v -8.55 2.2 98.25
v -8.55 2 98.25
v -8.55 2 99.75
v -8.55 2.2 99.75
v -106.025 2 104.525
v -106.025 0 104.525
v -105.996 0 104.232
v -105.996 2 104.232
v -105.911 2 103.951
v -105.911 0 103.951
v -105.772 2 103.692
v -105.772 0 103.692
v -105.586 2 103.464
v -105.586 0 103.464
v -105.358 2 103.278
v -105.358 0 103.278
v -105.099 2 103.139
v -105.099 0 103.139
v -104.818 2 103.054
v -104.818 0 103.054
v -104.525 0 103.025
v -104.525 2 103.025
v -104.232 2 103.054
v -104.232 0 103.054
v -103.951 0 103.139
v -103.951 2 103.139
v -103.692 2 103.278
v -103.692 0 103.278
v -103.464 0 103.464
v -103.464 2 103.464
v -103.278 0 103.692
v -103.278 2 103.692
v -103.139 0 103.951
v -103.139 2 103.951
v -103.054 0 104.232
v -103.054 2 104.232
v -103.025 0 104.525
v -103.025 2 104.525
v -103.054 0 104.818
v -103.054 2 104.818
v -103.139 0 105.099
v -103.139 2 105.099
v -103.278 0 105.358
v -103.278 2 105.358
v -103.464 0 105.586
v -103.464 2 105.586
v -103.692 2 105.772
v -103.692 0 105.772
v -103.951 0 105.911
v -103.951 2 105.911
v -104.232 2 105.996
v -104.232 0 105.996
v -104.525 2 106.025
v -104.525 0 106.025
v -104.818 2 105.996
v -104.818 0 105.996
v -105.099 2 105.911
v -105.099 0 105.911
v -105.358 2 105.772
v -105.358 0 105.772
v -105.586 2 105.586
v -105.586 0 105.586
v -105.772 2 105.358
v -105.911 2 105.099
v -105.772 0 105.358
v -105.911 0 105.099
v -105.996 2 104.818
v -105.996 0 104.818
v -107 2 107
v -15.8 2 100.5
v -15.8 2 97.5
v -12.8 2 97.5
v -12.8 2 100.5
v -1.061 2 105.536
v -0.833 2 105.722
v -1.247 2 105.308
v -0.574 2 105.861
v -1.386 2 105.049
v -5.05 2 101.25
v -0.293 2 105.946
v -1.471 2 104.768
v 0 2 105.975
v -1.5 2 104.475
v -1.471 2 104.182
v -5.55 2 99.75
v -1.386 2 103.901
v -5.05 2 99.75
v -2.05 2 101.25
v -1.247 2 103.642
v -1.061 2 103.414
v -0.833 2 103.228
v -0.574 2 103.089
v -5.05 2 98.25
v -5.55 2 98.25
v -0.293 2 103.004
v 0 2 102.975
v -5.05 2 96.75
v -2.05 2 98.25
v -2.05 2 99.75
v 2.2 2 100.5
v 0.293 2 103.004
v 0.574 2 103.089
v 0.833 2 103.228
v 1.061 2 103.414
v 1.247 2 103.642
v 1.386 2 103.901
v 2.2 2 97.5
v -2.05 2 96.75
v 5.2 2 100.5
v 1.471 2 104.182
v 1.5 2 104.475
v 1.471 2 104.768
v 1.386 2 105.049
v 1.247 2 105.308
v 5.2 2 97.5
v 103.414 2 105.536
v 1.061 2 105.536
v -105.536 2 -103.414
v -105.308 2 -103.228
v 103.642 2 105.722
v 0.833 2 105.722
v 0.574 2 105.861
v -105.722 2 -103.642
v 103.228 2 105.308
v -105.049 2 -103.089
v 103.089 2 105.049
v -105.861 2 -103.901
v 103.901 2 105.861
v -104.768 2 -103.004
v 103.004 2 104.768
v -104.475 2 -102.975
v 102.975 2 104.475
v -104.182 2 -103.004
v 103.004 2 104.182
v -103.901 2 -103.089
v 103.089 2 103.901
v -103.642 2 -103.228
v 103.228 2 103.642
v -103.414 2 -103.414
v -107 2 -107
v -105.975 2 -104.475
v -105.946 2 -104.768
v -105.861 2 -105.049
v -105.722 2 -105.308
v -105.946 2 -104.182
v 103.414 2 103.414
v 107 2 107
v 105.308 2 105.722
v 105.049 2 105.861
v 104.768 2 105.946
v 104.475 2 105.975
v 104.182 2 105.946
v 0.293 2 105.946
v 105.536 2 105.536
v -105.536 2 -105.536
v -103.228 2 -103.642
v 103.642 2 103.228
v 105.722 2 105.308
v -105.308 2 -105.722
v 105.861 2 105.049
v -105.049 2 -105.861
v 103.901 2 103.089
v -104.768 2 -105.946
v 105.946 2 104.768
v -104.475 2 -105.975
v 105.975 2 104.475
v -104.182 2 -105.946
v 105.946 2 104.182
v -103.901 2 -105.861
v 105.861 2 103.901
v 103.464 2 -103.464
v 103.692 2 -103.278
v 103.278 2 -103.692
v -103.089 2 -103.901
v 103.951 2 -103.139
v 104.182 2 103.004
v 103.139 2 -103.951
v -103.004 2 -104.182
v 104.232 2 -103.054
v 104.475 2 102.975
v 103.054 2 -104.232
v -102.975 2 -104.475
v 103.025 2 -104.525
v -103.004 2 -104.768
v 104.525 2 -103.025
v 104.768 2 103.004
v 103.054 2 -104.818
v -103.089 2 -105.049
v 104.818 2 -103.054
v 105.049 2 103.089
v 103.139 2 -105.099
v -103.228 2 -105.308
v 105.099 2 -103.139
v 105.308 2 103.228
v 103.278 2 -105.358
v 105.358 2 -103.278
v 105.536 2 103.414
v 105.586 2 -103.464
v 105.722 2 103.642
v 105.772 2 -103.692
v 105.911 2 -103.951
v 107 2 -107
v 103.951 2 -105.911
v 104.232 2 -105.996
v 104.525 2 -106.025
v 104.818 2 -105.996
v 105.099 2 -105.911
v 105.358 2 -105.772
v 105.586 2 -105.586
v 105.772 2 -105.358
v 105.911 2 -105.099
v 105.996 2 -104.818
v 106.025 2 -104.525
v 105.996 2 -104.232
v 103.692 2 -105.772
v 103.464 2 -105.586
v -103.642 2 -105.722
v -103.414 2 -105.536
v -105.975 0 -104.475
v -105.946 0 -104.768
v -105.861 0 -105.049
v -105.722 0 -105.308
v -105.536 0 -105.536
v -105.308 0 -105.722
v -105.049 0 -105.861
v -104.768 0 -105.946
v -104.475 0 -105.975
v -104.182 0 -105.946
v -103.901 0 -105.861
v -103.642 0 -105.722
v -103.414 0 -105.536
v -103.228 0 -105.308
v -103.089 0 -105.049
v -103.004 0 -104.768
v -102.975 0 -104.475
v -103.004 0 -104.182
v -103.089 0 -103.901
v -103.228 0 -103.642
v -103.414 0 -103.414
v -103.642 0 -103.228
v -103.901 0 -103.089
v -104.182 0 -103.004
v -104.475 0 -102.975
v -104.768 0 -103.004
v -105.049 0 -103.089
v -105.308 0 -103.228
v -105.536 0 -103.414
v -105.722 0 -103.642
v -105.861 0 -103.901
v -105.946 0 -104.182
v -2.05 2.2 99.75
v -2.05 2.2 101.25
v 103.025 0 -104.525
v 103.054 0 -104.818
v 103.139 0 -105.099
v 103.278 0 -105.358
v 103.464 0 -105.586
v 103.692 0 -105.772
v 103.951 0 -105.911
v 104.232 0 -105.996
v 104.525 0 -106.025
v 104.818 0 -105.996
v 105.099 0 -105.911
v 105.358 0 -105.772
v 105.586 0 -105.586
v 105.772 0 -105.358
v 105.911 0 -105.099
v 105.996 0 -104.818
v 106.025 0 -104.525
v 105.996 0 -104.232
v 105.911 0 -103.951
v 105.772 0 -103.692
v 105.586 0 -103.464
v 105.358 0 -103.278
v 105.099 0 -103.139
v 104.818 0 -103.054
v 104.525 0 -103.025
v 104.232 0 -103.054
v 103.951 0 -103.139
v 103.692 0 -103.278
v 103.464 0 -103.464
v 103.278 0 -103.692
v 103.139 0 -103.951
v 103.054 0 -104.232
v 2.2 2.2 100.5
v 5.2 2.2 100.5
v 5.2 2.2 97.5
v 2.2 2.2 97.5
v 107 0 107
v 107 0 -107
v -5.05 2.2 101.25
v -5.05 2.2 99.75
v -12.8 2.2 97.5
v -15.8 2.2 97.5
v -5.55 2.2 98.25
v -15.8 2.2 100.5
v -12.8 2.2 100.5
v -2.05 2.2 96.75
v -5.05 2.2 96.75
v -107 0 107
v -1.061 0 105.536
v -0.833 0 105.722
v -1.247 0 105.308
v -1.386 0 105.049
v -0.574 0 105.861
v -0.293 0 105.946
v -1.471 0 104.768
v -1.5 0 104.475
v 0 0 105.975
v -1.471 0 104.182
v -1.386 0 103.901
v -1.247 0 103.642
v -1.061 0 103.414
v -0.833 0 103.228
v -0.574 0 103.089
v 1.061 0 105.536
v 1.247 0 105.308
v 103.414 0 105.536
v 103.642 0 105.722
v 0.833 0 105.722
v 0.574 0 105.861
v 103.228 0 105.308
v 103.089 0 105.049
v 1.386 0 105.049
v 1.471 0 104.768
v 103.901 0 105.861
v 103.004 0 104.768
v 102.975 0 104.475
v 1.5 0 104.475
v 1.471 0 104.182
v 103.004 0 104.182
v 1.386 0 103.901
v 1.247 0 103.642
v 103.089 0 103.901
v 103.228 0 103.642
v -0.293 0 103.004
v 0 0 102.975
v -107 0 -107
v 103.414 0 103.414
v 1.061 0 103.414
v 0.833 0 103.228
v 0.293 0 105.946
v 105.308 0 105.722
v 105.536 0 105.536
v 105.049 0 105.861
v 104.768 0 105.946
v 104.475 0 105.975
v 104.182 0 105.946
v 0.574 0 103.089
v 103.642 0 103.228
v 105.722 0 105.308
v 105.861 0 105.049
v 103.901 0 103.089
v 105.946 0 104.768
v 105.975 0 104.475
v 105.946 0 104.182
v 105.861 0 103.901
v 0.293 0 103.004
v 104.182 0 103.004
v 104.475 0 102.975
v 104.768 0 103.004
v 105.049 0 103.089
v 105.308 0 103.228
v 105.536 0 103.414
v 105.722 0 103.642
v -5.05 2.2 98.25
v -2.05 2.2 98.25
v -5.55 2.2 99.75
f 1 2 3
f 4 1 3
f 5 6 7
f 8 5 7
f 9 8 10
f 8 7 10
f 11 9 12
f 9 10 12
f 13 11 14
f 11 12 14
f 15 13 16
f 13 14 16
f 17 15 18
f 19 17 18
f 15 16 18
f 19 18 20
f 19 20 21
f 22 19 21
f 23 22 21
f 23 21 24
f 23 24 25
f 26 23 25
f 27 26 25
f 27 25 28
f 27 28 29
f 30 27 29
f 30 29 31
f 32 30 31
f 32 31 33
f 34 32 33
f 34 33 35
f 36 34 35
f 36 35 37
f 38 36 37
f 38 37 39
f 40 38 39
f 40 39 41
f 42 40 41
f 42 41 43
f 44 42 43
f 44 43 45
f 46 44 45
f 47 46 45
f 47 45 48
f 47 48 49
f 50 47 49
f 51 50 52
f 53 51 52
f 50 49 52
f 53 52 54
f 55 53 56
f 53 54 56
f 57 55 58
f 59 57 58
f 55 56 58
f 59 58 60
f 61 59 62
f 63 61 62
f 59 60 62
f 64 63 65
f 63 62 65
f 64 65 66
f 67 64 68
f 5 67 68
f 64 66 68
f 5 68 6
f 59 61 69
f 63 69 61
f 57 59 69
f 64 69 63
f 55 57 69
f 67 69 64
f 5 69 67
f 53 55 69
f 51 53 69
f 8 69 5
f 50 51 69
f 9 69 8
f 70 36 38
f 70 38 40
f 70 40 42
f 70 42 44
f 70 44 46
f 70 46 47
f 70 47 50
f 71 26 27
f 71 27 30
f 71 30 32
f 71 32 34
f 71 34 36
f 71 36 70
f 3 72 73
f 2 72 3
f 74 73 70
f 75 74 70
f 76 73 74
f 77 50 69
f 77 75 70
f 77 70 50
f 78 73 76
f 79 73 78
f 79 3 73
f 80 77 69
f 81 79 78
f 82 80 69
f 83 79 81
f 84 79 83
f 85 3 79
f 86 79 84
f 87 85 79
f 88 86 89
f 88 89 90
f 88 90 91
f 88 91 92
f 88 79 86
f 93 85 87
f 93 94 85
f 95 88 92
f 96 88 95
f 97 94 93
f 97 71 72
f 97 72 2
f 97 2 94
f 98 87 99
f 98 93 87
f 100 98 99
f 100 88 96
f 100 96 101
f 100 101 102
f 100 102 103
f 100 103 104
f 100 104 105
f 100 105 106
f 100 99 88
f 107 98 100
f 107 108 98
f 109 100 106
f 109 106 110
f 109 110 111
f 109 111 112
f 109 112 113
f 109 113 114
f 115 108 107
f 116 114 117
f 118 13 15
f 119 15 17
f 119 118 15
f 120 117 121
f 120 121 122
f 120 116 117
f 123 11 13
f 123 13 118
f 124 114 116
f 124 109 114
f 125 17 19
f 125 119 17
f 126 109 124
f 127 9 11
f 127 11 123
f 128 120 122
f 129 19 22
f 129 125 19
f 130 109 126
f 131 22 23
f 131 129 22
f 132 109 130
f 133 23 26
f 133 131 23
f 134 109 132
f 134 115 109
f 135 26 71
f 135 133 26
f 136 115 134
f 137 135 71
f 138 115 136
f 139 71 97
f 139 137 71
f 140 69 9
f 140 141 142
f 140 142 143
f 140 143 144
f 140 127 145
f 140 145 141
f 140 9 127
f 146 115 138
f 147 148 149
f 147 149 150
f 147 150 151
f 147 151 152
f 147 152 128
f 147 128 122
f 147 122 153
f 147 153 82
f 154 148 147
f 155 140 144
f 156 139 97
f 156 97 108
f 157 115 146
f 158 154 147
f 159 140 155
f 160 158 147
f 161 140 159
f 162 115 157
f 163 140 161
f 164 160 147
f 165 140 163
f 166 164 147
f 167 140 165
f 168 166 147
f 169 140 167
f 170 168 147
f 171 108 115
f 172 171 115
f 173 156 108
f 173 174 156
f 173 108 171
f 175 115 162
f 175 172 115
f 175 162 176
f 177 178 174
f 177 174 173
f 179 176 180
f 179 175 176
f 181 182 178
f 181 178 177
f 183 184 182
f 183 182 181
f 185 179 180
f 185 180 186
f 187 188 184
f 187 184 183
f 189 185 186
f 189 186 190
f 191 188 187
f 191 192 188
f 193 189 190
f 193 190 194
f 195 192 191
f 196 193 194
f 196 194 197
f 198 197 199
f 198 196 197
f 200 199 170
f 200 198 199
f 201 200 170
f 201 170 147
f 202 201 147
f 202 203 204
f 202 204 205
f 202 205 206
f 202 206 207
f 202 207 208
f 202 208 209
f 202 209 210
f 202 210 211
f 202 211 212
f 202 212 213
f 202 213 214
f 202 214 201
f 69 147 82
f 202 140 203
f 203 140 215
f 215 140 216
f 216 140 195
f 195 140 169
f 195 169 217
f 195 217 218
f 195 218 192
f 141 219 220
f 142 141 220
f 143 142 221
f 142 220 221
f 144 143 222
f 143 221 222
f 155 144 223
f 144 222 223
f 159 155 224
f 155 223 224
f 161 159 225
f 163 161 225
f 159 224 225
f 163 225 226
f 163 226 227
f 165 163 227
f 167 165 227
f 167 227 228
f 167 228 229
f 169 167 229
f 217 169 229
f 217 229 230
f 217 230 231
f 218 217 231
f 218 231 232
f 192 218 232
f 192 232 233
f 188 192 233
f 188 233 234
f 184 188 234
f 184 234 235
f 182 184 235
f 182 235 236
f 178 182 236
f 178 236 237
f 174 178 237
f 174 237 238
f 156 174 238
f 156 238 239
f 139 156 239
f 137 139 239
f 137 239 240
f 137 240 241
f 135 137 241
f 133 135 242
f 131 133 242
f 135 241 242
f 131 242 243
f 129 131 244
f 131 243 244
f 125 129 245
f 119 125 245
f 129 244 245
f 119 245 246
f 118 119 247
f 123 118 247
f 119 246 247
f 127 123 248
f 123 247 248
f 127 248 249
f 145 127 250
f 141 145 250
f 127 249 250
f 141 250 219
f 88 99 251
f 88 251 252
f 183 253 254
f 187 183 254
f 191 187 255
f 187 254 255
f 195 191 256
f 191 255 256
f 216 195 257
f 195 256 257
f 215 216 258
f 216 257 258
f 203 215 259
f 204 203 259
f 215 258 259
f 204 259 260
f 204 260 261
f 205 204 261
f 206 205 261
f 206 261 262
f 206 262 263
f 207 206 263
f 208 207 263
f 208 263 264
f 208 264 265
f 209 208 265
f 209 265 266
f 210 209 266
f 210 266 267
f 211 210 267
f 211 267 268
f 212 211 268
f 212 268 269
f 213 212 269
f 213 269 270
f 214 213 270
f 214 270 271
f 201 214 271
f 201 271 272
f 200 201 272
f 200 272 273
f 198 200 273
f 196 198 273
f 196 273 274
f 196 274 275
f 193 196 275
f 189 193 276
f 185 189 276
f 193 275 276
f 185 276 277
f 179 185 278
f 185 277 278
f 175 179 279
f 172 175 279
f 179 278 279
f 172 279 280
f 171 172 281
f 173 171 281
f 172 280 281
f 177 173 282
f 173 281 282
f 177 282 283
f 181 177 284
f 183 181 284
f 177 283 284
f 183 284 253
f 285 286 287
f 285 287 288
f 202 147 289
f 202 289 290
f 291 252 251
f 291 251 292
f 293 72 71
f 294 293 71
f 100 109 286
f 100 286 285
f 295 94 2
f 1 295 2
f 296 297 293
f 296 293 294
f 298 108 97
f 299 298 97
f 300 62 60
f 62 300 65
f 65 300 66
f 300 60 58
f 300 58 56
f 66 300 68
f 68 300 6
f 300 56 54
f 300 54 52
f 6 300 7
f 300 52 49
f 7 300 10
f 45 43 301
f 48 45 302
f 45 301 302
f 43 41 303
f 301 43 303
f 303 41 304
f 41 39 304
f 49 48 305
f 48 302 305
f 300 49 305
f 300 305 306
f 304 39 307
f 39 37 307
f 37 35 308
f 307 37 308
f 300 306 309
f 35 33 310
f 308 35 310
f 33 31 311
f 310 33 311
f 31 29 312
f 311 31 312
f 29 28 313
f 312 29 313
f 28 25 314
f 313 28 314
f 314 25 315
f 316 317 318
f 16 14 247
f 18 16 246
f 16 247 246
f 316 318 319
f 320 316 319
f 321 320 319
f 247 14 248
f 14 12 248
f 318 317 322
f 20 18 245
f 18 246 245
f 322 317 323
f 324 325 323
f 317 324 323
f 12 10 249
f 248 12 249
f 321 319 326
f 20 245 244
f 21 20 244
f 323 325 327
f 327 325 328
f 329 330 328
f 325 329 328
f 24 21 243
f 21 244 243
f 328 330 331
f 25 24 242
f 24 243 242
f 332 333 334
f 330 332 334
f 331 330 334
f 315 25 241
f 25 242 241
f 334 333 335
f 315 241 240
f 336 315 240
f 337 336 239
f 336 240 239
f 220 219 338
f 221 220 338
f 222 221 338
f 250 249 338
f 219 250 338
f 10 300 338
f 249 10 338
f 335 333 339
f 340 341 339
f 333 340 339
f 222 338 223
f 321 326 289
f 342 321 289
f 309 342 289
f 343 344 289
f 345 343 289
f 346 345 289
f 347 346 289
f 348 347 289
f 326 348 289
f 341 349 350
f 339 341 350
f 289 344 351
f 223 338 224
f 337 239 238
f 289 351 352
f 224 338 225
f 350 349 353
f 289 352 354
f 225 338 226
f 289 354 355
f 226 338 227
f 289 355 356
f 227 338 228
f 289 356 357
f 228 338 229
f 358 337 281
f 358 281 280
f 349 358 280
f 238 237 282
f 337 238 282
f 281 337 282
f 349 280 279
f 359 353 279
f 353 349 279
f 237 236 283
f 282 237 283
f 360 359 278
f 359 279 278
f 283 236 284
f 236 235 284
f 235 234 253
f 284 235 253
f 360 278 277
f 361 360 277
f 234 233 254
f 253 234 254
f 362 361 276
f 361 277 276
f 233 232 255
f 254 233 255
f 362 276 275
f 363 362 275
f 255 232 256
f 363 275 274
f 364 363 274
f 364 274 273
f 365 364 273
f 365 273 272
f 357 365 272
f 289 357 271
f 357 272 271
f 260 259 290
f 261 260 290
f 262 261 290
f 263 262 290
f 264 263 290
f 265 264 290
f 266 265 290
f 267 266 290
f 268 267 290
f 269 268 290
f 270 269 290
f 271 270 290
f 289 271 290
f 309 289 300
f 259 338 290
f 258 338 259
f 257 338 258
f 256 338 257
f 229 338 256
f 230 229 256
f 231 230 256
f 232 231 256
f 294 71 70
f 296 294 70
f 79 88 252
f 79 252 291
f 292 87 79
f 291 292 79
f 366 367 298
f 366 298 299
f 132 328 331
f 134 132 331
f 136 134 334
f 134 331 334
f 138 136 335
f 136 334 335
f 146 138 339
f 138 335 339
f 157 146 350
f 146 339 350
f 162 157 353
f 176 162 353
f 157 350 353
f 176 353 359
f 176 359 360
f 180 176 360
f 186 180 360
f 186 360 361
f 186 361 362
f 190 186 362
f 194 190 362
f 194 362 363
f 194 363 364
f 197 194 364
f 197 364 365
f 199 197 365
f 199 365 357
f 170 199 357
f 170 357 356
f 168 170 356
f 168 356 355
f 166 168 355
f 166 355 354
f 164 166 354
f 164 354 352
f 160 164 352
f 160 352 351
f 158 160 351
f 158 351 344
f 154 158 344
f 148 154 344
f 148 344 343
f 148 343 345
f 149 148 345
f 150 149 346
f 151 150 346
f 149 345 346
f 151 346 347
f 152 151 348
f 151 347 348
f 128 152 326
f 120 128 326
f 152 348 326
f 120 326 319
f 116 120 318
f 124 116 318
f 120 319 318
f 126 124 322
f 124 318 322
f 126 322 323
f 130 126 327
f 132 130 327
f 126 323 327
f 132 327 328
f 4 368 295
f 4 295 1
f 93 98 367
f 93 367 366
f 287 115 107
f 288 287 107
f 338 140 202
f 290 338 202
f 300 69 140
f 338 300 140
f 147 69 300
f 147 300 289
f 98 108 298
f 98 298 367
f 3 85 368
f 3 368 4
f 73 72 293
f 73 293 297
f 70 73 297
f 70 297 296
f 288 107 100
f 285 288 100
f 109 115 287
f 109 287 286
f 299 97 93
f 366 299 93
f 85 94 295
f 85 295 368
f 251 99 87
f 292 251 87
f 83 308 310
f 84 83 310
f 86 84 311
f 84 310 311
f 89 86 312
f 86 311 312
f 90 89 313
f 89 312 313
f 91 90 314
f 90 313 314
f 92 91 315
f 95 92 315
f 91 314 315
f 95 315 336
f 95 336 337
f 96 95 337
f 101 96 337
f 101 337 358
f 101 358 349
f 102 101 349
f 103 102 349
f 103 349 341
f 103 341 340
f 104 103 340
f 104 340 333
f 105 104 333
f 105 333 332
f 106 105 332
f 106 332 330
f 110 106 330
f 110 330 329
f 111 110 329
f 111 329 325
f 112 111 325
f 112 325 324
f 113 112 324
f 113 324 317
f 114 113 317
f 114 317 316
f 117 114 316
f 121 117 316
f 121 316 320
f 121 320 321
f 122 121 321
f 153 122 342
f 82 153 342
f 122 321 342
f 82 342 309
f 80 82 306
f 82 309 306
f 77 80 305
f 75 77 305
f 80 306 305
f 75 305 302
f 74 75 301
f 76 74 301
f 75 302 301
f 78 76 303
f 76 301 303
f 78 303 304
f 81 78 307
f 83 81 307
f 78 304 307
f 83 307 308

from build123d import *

# Parameters (mm, degrees)
CROQUIS1_W                    = 214
CROQUIS1_H                    = 214
SALIENTE_EXTRUIR1_DEPTH       = 2
CROQUIS2_W                    = 3
CROQUIS2_H                    = 3
SALIENTE_EXTRUIR2_DEPTH       = 0.2
CROQUIS3_W                    = 3
CROQUIS3_H                    = 3
SALIENTE_EXTRUIR3_DEPTH       = 0.2
CROQUIS4_W                    = 3
CROQUIS4_H                    = 1.5
SALIENTE_EXTRUIR4_DEPTH       = 0.2
CROQUIS5_W                    = 3
CROQUIS5_H                    = 1.5
SALIENTE_EXTRUIR5_DEPTH       = 0.2
CROQUIS6_W                    = 3
CROQUIS6_H                    = 1.5
SALIENTE_EXTRUIR6_DEPTH       = 0.2
DI_METRO_DE_TALADRO_3_0_3_1_D = 3


with BuildPart() as part:
    # Croquis1 → Saliente-Extruir1 (new body)
    with BuildSketch(Plane(origin=(0, 2, 0), x_dir=(1, 0, 0), z_dir=(0, 1, 0))):
        Rectangle(CROQUIS1_W, CROQUIS1_H)
    extrude(amount=-SALIENTE_EXTRUIR1_DEPTH)

    # Croquis2 → Saliente-Extruir2 (add)
    with BuildSketch(Plane(origin=(0, 2, 0), x_dir=(-1, 0, 0), z_dir=(0, 1, 0))):
        with Locations((-3.7, 99)):
            Rectangle(CROQUIS2_W, CROQUIS2_H)
    extrude(amount=SALIENTE_EXTRUIR2_DEPTH)

    # Croquis3 → Saliente-Extruir3 (add)
    with BuildSketch(Plane(origin=(0, 2, 0), x_dir=(-1, 0, 0), z_dir=(0, 1, 0))):
        with Locations((14.3, 99)):
            Rectangle(CROQUIS3_W, CROQUIS3_H)
    extrude(amount=SALIENTE_EXTRUIR3_DEPTH)

    # Croquis4 → Saliente-Extruir4 (add)
    with BuildSketch(Plane(origin=(0, 2, 0), x_dir=(-1, 0, 0), z_dir=(0, 1, 0))):
        with Locations((7.05, 99)):
            Rectangle(CROQUIS4_W, CROQUIS4_H)
    extrude(amount=SALIENTE_EXTRUIR4_DEPTH)

    # Croquis5 → Saliente-Extruir5 (add)
    with BuildSketch(Plane(origin=(0, 2, 0), x_dir=(-1, 0, 0), z_dir=(0, 1, 0))):
        with Locations((3.55, 97.5)):
            Rectangle(CROQUIS5_W, CROQUIS5_H)
    extrude(amount=SALIENTE_EXTRUIR5_DEPTH)

    # Croquis6 → Saliente-Extruir6 (add)
    with BuildSketch(Plane(origin=(0, 2, 0), x_dir=(-1, 0, 0), z_dir=(0, 1, 0))):
        with Locations((3.55, 100.5)):
            Rectangle(CROQUIS6_W, CROQUIS6_H)
    extrude(amount=SALIENTE_EXTRUIR6_DEPTH)

    # Diámetro de taladro Ø3.0 (3)1 (through all)
    with Locations(Plane(origin=(0, 2, 0), x_dir=(1, 0, 0), z_dir=(0, 1, 0))):
        with Locations((104.525132309, 104.525132309), (-104.525126266, -104.525126266), (104.474867691, -104.474867691), (-104.474867691, 104.474867691), (0, -104.474867691)):
            Hole(DI_METRO_DE_TALADRO_3_0_3_1_D / 2)


solid = part.part
